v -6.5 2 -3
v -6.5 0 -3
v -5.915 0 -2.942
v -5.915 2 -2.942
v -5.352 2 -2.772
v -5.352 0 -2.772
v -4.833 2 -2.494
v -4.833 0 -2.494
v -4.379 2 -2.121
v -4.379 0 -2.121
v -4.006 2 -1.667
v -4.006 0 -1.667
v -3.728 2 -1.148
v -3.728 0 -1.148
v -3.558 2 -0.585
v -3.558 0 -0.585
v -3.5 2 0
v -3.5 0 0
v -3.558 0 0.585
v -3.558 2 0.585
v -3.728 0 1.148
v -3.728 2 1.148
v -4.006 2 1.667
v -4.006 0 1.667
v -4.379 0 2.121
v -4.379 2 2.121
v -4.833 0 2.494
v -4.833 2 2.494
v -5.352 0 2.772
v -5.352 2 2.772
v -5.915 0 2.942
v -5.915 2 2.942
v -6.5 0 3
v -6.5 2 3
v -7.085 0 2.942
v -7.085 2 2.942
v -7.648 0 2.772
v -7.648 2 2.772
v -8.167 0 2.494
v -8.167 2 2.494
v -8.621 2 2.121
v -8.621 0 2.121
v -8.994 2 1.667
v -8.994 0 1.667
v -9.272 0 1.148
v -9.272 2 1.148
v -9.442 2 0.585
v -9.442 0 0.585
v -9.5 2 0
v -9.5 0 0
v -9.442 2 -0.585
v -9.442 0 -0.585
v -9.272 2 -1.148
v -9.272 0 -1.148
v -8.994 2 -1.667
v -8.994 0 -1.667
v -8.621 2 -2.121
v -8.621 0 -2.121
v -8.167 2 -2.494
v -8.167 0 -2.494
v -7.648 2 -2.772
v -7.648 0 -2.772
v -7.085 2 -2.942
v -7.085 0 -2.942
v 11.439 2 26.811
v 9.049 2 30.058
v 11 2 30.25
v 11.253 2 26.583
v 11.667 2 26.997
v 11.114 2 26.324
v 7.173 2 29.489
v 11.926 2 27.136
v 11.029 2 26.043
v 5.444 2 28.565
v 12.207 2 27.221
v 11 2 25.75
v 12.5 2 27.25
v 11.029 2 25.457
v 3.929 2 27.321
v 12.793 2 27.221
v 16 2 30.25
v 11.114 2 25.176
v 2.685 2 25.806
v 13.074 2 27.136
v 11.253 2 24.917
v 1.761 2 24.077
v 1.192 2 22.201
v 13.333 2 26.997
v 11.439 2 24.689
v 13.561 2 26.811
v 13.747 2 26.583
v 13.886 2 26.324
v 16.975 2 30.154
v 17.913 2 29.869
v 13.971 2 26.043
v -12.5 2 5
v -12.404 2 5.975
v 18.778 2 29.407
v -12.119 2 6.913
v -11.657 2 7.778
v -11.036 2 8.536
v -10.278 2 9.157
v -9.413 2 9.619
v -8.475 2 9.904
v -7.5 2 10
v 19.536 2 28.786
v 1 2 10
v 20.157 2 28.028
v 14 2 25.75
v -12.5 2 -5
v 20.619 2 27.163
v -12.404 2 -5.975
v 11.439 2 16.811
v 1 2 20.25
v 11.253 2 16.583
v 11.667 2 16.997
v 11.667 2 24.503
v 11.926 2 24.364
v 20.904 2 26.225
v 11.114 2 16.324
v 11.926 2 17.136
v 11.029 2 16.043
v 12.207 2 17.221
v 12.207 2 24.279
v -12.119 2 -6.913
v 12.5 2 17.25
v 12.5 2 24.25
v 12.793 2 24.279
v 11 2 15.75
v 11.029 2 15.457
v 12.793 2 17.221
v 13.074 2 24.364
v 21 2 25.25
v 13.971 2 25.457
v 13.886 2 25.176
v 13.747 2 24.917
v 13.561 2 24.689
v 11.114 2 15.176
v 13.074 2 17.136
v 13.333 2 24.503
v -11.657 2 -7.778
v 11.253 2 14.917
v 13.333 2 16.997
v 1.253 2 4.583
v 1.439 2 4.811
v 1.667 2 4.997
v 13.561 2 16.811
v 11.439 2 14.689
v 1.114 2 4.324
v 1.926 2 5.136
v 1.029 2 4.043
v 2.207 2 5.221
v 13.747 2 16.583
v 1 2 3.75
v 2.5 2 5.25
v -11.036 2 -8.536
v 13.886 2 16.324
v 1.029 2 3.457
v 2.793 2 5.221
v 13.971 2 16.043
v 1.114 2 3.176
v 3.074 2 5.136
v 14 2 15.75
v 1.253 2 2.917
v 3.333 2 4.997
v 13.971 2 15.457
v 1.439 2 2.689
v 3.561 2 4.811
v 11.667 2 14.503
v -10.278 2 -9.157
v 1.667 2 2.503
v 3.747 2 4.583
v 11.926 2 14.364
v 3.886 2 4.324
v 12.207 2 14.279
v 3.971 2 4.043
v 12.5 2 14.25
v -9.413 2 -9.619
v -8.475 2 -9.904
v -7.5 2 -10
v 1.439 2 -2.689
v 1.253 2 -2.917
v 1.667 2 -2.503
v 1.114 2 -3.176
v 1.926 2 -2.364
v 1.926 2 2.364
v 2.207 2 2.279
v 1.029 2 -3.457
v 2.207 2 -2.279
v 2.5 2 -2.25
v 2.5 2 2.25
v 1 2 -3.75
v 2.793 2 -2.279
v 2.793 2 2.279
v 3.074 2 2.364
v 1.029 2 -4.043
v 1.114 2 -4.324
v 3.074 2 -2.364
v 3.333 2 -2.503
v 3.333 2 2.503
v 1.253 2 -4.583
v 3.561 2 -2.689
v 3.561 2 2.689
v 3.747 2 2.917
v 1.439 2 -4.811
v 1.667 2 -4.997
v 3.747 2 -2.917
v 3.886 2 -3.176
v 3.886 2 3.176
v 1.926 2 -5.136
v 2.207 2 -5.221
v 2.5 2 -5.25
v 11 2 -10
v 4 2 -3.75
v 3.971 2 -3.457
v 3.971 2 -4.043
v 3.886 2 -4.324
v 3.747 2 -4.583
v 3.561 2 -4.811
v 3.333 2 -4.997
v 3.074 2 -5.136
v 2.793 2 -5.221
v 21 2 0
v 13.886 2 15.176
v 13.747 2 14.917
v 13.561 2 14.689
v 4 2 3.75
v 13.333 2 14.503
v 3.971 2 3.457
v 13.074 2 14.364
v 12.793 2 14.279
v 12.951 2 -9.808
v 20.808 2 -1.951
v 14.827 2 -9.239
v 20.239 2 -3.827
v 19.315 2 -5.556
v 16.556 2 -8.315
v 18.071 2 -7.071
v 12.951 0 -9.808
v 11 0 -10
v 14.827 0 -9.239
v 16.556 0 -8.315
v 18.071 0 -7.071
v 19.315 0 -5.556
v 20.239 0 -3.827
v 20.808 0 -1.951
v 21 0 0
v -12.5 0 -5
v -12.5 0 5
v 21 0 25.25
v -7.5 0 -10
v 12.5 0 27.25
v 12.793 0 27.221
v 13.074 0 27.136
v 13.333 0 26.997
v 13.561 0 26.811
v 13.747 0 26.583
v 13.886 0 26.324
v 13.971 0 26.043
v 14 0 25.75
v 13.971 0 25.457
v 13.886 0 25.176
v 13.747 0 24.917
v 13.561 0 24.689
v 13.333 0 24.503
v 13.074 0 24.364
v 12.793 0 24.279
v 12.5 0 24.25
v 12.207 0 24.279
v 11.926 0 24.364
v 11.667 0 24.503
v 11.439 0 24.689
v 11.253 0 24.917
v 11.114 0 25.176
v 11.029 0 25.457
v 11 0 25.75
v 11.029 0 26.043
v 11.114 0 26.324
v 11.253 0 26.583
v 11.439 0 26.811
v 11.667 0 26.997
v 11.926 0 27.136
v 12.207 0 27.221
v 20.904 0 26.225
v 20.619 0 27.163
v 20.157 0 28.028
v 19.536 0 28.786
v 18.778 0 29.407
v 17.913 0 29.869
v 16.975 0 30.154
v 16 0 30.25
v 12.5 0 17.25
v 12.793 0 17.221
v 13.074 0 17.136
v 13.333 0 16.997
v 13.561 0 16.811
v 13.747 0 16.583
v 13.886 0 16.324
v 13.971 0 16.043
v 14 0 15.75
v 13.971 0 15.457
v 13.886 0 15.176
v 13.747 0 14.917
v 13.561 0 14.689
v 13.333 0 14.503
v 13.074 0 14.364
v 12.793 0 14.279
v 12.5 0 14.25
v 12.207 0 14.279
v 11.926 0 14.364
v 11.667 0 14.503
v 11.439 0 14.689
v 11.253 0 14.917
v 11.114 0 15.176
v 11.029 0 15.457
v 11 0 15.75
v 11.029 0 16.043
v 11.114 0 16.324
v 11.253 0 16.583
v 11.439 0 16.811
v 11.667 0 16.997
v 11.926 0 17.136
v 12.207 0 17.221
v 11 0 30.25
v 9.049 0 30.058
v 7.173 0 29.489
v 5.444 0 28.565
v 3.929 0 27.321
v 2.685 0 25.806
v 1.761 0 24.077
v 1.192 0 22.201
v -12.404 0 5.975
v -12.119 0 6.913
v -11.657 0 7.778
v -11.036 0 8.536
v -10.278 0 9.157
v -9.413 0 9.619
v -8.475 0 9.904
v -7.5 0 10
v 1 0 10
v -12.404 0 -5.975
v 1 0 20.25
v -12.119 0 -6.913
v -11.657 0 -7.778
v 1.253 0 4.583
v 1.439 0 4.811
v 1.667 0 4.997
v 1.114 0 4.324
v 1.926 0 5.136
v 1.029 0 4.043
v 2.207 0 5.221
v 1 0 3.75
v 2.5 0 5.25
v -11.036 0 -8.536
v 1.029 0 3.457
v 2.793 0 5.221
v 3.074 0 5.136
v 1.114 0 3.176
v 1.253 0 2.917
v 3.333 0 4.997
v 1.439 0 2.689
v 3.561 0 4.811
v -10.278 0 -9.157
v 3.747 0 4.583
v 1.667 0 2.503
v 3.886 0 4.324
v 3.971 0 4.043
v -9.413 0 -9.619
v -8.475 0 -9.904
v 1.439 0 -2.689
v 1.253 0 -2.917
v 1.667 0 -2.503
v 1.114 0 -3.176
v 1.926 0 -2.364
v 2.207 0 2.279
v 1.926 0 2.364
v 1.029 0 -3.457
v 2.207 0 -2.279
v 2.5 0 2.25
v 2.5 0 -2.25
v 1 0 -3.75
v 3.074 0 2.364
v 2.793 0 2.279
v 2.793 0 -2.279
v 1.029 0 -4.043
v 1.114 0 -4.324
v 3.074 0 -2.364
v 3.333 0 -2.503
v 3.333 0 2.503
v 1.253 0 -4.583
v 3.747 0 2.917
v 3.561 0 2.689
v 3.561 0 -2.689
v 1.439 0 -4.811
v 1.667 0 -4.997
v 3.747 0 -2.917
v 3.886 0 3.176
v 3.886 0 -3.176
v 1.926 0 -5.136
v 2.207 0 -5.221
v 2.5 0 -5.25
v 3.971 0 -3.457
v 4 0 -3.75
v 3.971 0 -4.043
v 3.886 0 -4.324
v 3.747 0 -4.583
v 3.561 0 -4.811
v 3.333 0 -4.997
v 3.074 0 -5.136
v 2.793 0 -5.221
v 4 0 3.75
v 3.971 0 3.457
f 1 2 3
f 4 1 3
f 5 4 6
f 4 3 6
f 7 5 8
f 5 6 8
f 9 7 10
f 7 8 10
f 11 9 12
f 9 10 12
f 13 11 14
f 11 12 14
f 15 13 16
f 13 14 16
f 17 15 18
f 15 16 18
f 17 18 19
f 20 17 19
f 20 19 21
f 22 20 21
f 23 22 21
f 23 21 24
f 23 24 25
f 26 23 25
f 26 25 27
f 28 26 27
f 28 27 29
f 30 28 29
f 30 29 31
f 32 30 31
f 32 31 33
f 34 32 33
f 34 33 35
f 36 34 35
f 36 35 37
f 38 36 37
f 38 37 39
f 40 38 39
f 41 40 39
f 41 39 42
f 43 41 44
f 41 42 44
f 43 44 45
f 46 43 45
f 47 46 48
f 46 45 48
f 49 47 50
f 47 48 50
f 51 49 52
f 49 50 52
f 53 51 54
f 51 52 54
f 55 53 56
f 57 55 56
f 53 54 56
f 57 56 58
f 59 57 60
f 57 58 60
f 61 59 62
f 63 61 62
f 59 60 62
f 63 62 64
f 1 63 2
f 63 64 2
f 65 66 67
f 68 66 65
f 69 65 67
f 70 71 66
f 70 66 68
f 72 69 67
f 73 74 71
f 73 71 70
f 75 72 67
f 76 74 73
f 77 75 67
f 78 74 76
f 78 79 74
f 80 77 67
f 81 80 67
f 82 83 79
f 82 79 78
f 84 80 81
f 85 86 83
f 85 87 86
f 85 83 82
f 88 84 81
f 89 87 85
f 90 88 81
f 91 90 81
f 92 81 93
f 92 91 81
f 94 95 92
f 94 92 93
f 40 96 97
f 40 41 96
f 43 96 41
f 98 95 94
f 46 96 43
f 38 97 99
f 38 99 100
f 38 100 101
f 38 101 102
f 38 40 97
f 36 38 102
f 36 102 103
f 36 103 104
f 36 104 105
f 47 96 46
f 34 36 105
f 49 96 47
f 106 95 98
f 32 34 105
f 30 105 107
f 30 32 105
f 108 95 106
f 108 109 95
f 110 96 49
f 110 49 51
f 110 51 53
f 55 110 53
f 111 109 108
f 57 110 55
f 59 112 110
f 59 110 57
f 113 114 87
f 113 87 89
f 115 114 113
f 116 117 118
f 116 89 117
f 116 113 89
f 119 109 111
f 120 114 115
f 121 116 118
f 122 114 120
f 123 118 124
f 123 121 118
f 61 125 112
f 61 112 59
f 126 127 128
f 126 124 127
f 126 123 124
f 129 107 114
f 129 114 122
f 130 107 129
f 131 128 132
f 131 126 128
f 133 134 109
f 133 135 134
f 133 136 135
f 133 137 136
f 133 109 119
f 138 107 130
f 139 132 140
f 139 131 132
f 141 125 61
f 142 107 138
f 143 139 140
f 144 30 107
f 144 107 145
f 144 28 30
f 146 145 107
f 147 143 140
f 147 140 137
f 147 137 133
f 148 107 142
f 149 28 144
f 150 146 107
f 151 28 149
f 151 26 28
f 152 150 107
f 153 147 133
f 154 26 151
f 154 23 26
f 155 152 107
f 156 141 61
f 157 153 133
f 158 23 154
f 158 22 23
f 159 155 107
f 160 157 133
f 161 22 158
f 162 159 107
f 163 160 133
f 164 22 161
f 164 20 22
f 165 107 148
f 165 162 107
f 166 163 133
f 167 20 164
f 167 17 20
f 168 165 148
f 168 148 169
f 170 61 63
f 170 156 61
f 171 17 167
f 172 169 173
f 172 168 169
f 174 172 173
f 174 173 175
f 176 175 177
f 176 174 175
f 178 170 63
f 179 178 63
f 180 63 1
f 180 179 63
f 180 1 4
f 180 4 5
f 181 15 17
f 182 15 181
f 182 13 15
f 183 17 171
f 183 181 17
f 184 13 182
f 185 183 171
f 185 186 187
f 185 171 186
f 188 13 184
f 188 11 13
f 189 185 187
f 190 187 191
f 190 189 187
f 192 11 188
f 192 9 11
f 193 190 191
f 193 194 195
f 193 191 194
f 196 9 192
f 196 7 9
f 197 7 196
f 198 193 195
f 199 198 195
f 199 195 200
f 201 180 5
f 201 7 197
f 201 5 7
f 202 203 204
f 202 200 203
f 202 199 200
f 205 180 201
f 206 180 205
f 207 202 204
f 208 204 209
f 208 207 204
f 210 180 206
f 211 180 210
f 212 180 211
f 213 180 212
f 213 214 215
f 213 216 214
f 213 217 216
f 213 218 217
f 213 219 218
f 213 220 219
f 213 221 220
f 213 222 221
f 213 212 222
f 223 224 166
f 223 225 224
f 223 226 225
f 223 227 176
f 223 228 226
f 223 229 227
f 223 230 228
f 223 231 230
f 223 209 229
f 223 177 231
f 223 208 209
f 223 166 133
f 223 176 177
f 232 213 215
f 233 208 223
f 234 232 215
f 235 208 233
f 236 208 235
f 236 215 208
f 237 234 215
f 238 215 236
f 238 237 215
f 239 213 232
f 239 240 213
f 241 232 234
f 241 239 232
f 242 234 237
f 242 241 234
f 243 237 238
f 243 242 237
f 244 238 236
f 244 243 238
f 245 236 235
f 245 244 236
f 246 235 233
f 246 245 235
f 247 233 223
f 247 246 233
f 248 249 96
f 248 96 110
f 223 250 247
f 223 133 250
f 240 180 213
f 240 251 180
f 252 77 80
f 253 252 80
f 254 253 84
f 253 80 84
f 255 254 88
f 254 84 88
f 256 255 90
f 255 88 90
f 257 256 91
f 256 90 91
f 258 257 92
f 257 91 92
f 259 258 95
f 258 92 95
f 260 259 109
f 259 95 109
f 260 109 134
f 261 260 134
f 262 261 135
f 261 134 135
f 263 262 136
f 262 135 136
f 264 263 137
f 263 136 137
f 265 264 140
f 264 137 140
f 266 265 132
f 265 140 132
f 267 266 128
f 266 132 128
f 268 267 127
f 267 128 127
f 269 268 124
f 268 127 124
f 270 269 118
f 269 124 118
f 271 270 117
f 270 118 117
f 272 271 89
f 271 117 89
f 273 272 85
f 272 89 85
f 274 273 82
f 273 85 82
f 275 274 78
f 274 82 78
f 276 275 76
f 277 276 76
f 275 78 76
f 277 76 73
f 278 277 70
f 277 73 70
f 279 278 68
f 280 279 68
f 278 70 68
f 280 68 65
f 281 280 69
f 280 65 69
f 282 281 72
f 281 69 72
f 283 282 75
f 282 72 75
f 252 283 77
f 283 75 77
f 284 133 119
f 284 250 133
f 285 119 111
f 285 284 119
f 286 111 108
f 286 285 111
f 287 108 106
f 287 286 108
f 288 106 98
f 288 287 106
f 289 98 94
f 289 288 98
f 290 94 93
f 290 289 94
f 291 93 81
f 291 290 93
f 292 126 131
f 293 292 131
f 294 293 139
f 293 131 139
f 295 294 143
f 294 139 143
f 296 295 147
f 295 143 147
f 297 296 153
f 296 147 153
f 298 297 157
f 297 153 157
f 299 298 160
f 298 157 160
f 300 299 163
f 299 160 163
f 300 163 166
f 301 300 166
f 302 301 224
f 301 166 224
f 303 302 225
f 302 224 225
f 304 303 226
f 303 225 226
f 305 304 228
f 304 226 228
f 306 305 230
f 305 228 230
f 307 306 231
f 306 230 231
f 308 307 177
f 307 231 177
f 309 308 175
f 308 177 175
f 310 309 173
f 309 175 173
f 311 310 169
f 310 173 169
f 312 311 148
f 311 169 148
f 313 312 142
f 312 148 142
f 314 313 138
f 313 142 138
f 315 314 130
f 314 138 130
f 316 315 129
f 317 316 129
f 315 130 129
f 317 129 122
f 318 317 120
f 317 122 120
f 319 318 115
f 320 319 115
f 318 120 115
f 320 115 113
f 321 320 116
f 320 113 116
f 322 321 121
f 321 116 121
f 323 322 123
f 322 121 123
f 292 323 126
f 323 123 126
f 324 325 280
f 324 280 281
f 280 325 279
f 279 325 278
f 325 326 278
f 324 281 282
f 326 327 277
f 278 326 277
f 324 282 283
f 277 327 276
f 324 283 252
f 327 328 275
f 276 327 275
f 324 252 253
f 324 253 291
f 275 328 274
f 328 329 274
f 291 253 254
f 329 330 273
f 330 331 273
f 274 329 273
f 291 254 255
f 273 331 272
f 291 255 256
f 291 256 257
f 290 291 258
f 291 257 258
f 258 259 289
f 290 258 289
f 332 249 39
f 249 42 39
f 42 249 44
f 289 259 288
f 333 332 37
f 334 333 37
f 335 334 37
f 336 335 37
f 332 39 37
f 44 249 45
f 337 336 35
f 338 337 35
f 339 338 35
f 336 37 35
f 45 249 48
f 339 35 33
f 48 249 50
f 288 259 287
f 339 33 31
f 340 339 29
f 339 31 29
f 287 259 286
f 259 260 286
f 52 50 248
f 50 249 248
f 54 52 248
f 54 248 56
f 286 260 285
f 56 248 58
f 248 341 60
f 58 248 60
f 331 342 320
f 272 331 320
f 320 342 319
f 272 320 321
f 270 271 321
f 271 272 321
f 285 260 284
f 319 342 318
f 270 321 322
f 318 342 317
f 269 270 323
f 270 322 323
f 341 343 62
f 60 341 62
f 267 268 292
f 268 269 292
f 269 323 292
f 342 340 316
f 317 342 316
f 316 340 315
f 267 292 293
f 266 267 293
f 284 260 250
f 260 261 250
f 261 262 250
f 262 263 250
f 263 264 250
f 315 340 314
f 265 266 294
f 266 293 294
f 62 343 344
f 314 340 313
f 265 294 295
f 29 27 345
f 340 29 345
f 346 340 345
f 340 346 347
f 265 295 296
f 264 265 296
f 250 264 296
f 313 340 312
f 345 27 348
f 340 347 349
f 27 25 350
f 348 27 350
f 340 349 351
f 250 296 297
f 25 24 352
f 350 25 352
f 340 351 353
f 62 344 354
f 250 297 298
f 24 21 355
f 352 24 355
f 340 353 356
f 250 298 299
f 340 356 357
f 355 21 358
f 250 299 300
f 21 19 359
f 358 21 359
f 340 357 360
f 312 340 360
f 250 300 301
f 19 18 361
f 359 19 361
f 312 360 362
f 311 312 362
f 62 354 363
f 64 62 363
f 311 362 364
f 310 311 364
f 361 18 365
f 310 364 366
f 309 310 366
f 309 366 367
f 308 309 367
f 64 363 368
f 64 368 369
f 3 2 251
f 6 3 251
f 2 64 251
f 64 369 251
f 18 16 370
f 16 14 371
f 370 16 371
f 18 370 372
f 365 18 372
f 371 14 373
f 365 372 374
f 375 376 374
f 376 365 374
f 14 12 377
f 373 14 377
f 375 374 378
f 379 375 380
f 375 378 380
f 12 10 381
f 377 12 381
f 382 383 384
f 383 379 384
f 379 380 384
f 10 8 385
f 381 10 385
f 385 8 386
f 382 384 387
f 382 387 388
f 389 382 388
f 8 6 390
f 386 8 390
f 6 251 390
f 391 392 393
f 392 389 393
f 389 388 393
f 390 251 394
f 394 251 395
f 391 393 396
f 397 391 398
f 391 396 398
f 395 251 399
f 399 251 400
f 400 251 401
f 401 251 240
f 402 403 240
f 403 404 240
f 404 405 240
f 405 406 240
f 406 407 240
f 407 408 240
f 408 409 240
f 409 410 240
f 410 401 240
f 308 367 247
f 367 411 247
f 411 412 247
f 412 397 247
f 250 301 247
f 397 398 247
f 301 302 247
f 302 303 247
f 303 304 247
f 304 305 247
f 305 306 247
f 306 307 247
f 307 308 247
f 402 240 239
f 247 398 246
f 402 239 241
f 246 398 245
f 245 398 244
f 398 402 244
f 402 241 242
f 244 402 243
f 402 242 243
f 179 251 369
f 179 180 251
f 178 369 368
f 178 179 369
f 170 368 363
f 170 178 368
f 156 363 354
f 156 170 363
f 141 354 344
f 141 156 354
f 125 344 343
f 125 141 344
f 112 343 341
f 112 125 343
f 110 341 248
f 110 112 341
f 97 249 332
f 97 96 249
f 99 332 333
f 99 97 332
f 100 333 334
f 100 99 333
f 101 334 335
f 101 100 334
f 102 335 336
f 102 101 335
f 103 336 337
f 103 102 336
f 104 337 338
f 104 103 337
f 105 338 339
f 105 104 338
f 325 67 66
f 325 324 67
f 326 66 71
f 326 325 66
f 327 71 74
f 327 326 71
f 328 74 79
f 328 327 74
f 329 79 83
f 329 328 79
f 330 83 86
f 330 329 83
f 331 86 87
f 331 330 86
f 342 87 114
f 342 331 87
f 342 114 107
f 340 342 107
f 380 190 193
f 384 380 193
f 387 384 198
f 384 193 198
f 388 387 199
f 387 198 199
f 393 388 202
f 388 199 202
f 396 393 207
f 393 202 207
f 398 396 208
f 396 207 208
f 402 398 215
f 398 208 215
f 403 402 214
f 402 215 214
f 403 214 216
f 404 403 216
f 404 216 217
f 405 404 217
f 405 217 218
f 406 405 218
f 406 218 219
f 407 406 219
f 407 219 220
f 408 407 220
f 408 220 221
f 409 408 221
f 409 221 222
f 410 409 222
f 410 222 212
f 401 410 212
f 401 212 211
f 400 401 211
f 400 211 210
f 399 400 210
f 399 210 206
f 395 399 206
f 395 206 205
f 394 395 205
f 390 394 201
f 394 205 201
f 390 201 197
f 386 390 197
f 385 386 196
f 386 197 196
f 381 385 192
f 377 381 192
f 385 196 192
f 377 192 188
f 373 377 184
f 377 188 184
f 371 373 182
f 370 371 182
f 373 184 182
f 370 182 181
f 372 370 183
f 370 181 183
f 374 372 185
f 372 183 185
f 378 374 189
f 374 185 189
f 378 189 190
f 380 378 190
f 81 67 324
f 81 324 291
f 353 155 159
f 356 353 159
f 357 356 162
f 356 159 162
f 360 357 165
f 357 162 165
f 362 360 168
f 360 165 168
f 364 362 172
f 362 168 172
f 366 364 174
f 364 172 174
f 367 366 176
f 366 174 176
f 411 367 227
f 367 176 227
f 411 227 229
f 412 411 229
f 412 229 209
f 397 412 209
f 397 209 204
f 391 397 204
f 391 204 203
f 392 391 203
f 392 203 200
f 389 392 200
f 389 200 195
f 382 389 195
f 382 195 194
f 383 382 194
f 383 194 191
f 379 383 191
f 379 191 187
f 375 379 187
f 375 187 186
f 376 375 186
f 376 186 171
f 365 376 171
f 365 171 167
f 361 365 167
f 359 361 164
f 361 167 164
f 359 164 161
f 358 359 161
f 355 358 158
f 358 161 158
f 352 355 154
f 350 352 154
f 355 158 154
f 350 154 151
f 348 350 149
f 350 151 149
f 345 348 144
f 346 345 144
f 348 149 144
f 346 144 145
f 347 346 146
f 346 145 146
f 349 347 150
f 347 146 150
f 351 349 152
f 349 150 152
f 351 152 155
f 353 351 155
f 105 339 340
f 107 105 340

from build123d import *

# Parameters (mm, degrees)
SKETCH1_W           = 25
SKETCH1_H           = 20
BOSS_EXTRUDE1_DEPTH = 2
CUT_EXTRUDE1_REACH  = 18.132
SKETCH2_R           = 1.5
CUT_EXTRUDE2_REACH  = 18.132
SKETCH3_R           = 3
SKETCH4_W           = 20
SKETCH4_H           = 25
BOSS_EXTRUDE2_DEPTH = 2
BOSS_EXTRUDE3_DEPTH = 2
SKETCH6_R           = 1.5
CUT_EXTRUDE3_DEPTH  = 2
SKETCH7_W           = 8.5
SKETCH7_H           = 15.25
BOSS_EXTRUDE5_DEPTH = 2
FILLET1_R           = 10
FILLET2_R           = 5


with BuildPart() as part:
    # Sketch1 → Boss-Extrude1 (new body)
    with BuildSketch(Plane(origin=(0, 0, 0), x_dir=(1, 0, 0), z_dir=(0, 1, 0))):
        Rectangle(SKETCH1_W, SKETCH1_H)
    extrude(amount=BOSS_EXTRUDE1_DEPTH)

    # Sketch2 → Cut-Extrude1 (cut, up to next)
    with BuildSketch(Plane(origin=(0, 2, 0), x_dir=(1, 0, 0), z_dir=(0, 1, 0)), mode=Mode.PRIVATE) as cut_extrude1_sk1:
        with Locations(Location((-6.5, 0, 0), (0, 0, 270))):
            Circle(SKETCH2_R)
    cut_extrude1_tool1 = extrude(cut_extrude1_sk1.sketch, amount=-CUT_EXTRUDE1_REACH, mode=Mode.PRIVATE) & part.part
    # Sketch2 → Cut-Extrude1 (cut, up to next)
    with BuildSketch(Plane(origin=(0, 2, 0), x_dir=(1, 0, 0), z_dir=(0, 1, 0)), mode=Mode.PRIVATE) as cut_extrude1_sk2:
        with Locations(Location((2.5, 3.75, 0), (0, 0, 270))):
            Circle(SKETCH2_R)
    cut_extrude1_tool2 = extrude(cut_extrude1_sk2.sketch, amount=-CUT_EXTRUDE1_REACH, mode=Mode.PRIVATE) & part.part
    # Sketch2 → Cut-Extrude1 (cut, up to next)
    with BuildSketch(Plane(origin=(0, 2, 0), x_dir=(1, 0, 0), z_dir=(0, 1, 0)), mode=Mode.PRIVATE) as cut_extrude1_sk3:
        with Locations(Location((2.5, -3.75, 0), (0, 0, 270))):
            Circle(SKETCH2_R)
    cut_extrude1_tool3 = extrude(cut_extrude1_sk3.sketch, amount=-CUT_EXTRUDE1_REACH, mode=Mode.PRIVATE) & part.part
    add(cut_extrude1_tool1.solids().sort_by_distance((-6.5, 2, 0))[0], mode=Mode.SUBTRACT)
    add(cut_extrude1_tool2.solids().sort_by_distance((2.5, 2, -3.75))[0], mode=Mode.SUBTRACT)
    add(cut_extrude1_tool3.solids().sort_by_distance((2.5, 2, 3.75))[0], mode=Mode.SUBTRACT)

    # Sketch3 → Cut-Extrude2 (cut, up to next)
    with BuildSketch(Plane(origin=(0, 0, 0), x_dir=(-1, 0, 0), z_dir=(0, -1, 0)), mode=Mode.PRIVATE) as cut_extrude2_sk1:
        with Locations(Location((6.5, 0, 0), (0, 0, 90))):
            Circle(SKETCH3_R)
    cut_extrude2_tool1 = extrude(cut_extrude2_sk1.sketch, amount=-CUT_EXTRUDE2_REACH, mode=Mode.PRIVATE) & part.part
    add(cut_extrude2_tool1.solids().sort_by_distance((-6.5, 0, 0))[0], mode=Mode.SUBTRACT)

    # Sketch4 → Boss-Extrude2 (add)
    with BuildSketch(Plane(origin=(0, 2, 0), x_dir=(1, 0, 0), z_dir=(0, 1, 0))):
        with Locations((11, -17.75)):
            Rectangle(SKETCH4_W, SKETCH4_H)
    extrude(amount=-BOSS_EXTRUDE2_DEPTH)

    # Sketch5 → Boss-Extrude3 (add)
    with BuildSketch(Plane(origin=(0, 2, 0), x_dir=(1, 0, 0), z_dir=(0, 1, 0))):
        Polygon((12.5, 10), (12.5, -5.25), (21, -5.25), align=None)
    extrude(amount=-BOSS_EXTRUDE3_DEPTH)

    # Sketch6 → Cut-Extrude3 (cut)
    with BuildSketch(Plane(origin=(0, 2, 0), x_dir=(1, 0, 0), z_dir=(0, 1, 0))):
        with Locations(Location((12.5, -15.75, 0), (0, 0, 270))):
            Circle(SKETCH6_R)
        with Locations(Location((12.5, -25.75, 0), (0, 0, 270))):
            Circle(SKETCH6_R)
    extrude(amount=-CUT_EXTRUDE3_DEPTH, mode=Mode.SUBTRACT)

    # Sketch7 → Boss-Extrude5 (add)
    with BuildSketch(Plane(origin=(0, 2, 0), x_dir=(1, 0, 0), z_dir=(0, 1, 0))):
        with Locations((16.75, 2.375)):
            Rectangle(SKETCH7_W, SKETCH7_H)
    extrude(amount=-BOSS_EXTRUDE5_DEPTH)

    # Fillet1
    fillet1_edges = [part.edges().sort_by_distance(p)[0] for p in [
        (1, 1, 30.25),
        (21, 1, -10),
    ]]
    fillet(fillet1_edges, radius=FILLET1_R)

    # Fillet2
    fillet2_edges = [part.edges().sort_by_distance(p)[0] for p in [
        (21, 1, 30.25),
        (-12.5, 1, 10),
        (-12.5, 1, -10),
    ]]
    fillet(fillet2_edges, radius=FILLET2_R)


solid = part.part
